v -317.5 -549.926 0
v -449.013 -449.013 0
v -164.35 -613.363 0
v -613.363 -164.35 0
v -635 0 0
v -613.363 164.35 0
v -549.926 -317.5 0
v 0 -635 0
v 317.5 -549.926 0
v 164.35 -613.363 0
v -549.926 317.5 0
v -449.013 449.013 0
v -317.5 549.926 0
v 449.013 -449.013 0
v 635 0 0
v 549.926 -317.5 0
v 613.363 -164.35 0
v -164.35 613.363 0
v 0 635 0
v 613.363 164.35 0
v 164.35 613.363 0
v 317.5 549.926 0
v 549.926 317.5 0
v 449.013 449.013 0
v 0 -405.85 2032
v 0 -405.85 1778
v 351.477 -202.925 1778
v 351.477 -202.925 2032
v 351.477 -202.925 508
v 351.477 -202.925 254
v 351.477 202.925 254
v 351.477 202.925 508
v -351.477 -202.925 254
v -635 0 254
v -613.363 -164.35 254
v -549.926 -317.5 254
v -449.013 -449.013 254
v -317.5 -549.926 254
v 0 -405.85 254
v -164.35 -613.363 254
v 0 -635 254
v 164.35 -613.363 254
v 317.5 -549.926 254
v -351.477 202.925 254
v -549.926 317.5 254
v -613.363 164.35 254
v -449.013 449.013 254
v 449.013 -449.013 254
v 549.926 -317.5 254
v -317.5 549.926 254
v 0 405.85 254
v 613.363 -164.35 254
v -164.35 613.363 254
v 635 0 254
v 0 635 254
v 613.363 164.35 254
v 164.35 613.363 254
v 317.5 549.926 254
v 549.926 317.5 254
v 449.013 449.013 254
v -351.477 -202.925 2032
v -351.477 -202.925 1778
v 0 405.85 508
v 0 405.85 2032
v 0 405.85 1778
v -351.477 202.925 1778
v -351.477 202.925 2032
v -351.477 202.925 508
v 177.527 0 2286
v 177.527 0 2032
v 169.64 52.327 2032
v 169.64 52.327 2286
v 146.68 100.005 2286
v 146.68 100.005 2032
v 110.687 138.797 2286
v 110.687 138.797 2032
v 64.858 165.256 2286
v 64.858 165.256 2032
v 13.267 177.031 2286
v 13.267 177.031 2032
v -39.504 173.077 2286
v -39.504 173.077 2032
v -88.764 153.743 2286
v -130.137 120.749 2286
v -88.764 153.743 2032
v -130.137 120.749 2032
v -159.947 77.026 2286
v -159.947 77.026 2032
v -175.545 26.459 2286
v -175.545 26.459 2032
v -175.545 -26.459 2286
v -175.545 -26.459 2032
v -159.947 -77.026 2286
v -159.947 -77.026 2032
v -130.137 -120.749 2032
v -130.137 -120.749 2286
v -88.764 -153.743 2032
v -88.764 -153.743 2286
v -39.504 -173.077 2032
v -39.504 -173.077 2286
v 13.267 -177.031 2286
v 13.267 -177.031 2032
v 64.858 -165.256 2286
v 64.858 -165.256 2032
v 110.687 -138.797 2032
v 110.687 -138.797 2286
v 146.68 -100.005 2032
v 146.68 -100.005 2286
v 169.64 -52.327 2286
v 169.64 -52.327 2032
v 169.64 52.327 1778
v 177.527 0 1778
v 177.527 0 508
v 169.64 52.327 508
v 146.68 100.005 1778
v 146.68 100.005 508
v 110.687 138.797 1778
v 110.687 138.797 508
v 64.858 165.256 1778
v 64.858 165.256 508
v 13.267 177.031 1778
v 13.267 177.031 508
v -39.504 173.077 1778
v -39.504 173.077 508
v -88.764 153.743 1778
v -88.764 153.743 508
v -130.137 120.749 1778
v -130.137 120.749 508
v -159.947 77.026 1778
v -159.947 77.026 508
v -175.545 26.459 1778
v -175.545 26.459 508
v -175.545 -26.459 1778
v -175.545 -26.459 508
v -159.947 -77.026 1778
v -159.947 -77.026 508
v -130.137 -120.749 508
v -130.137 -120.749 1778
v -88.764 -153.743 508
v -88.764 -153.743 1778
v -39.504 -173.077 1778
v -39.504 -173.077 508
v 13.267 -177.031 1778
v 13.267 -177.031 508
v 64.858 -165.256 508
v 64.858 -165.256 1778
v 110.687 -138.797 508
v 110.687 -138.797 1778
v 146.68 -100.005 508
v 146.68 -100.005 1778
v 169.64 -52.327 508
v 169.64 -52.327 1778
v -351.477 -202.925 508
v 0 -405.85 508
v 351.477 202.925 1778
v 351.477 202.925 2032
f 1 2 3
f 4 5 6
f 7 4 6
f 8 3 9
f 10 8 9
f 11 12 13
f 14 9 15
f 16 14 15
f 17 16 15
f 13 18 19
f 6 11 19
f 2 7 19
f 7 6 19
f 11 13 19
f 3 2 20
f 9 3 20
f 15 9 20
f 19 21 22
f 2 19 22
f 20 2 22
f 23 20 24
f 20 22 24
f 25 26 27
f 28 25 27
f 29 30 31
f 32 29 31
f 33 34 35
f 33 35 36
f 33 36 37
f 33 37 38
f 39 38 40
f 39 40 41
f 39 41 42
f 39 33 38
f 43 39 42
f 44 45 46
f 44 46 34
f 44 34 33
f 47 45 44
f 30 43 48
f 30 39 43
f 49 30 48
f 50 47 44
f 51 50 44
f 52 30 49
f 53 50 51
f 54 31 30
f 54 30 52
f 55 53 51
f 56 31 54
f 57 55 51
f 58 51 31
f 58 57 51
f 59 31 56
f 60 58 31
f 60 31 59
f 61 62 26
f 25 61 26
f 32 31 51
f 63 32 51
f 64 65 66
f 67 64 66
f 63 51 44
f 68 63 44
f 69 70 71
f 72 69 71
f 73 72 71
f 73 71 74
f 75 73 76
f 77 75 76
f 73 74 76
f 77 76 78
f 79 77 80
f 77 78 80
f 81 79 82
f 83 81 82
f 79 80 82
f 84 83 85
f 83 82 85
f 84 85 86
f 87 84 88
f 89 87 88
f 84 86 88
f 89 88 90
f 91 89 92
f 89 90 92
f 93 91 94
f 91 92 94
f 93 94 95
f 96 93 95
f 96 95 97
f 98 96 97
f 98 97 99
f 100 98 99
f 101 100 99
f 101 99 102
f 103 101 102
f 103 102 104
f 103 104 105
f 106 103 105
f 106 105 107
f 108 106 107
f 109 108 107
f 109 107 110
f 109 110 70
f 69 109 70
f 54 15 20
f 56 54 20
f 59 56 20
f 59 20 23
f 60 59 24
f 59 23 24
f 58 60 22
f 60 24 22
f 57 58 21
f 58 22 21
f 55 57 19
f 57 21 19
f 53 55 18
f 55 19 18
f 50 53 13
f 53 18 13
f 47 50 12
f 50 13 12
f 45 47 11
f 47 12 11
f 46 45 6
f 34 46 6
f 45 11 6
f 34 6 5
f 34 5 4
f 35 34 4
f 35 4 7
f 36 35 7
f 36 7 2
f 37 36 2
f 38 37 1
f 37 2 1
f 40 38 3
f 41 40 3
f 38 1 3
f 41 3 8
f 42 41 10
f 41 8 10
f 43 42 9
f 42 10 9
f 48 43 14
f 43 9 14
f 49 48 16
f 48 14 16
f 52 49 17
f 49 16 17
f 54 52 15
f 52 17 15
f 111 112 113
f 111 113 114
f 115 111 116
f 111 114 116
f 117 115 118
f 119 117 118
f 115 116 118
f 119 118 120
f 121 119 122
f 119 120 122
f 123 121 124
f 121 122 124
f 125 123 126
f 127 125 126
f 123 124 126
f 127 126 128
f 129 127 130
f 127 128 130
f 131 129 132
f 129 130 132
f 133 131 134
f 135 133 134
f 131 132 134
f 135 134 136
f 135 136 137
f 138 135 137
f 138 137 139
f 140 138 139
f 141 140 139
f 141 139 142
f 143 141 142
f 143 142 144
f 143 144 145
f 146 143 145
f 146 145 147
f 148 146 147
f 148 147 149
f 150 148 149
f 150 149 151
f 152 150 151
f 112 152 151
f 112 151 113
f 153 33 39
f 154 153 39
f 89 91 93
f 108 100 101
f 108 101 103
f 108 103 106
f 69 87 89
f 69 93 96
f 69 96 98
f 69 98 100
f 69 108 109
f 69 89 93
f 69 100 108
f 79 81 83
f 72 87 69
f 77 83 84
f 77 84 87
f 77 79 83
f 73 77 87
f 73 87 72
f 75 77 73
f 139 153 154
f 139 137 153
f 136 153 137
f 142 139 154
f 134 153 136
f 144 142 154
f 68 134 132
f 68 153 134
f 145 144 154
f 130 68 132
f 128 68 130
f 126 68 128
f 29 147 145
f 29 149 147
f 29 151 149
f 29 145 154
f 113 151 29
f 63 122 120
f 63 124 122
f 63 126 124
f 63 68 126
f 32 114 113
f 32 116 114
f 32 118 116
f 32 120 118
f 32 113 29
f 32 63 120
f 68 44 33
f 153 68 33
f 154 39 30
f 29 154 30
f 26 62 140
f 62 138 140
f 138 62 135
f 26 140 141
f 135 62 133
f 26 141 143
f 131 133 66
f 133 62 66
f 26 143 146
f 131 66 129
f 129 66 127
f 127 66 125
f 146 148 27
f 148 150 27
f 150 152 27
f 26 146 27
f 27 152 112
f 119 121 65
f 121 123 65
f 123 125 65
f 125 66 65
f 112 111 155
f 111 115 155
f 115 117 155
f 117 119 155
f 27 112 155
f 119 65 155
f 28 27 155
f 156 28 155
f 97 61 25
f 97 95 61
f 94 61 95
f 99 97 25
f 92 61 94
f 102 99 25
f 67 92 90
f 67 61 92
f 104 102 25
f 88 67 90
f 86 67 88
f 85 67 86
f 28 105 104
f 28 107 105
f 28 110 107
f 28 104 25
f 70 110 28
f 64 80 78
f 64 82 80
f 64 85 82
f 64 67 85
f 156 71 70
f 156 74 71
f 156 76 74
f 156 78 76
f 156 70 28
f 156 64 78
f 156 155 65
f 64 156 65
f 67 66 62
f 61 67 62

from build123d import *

# Parameters (mm, degrees)
F0_R      = 635
F1_DEPTH  = 254
F3_DEPTH  = 254
F4_R      = 177.5274912945
F5_DEPTH  = 1778
F6_START  = 1270
F3_FACE_R = 177.5274912945
F6_DEPTH  = 254


with BuildPart() as f1:
    # F0 (on Top) → F1 (new body)
    with BuildSketch(Plane.XY):
        Circle(F0_R)
    extrude(amount=F1_DEPTH)

    # F2 (on face) → F3 (join)
    with BuildSketch(Plane.XY.offset(254)):
        Polygon((351.4767885208, -202.9252184664), (351.4767885208, 202.9252184664), (0, 405.8504369328), (-351.4767885208, 202.9252184664), (-351.4767885208, -202.9252184664), (0, -405.8504369328), align=None)
    extrude(amount=F3_DEPTH)

    # F4 (on face) → F5 (join)
    with BuildSketch(Plane.XY.offset(508)):
        Circle(F4_R)
    extrude(amount=F5_DEPTH)

    # F3_face (on face) → F6 (join)
    with BuildSketch(Plane.XY.offset(508).offset(F6_START)):
        Polygon((0, -405.8504369328), (351.4767885208, -202.9252184664), (351.4767885208, 202.9252184664), (0, 405.8504369328), (-351.4767885208, 202.9252184664), (-351.4767885208, -202.9252184664), align=None)
        Circle(F3_FACE_R, mode=Mode.SUBTRACT)
    extrude(amount=F6_DEPTH)


solid = f1.part
